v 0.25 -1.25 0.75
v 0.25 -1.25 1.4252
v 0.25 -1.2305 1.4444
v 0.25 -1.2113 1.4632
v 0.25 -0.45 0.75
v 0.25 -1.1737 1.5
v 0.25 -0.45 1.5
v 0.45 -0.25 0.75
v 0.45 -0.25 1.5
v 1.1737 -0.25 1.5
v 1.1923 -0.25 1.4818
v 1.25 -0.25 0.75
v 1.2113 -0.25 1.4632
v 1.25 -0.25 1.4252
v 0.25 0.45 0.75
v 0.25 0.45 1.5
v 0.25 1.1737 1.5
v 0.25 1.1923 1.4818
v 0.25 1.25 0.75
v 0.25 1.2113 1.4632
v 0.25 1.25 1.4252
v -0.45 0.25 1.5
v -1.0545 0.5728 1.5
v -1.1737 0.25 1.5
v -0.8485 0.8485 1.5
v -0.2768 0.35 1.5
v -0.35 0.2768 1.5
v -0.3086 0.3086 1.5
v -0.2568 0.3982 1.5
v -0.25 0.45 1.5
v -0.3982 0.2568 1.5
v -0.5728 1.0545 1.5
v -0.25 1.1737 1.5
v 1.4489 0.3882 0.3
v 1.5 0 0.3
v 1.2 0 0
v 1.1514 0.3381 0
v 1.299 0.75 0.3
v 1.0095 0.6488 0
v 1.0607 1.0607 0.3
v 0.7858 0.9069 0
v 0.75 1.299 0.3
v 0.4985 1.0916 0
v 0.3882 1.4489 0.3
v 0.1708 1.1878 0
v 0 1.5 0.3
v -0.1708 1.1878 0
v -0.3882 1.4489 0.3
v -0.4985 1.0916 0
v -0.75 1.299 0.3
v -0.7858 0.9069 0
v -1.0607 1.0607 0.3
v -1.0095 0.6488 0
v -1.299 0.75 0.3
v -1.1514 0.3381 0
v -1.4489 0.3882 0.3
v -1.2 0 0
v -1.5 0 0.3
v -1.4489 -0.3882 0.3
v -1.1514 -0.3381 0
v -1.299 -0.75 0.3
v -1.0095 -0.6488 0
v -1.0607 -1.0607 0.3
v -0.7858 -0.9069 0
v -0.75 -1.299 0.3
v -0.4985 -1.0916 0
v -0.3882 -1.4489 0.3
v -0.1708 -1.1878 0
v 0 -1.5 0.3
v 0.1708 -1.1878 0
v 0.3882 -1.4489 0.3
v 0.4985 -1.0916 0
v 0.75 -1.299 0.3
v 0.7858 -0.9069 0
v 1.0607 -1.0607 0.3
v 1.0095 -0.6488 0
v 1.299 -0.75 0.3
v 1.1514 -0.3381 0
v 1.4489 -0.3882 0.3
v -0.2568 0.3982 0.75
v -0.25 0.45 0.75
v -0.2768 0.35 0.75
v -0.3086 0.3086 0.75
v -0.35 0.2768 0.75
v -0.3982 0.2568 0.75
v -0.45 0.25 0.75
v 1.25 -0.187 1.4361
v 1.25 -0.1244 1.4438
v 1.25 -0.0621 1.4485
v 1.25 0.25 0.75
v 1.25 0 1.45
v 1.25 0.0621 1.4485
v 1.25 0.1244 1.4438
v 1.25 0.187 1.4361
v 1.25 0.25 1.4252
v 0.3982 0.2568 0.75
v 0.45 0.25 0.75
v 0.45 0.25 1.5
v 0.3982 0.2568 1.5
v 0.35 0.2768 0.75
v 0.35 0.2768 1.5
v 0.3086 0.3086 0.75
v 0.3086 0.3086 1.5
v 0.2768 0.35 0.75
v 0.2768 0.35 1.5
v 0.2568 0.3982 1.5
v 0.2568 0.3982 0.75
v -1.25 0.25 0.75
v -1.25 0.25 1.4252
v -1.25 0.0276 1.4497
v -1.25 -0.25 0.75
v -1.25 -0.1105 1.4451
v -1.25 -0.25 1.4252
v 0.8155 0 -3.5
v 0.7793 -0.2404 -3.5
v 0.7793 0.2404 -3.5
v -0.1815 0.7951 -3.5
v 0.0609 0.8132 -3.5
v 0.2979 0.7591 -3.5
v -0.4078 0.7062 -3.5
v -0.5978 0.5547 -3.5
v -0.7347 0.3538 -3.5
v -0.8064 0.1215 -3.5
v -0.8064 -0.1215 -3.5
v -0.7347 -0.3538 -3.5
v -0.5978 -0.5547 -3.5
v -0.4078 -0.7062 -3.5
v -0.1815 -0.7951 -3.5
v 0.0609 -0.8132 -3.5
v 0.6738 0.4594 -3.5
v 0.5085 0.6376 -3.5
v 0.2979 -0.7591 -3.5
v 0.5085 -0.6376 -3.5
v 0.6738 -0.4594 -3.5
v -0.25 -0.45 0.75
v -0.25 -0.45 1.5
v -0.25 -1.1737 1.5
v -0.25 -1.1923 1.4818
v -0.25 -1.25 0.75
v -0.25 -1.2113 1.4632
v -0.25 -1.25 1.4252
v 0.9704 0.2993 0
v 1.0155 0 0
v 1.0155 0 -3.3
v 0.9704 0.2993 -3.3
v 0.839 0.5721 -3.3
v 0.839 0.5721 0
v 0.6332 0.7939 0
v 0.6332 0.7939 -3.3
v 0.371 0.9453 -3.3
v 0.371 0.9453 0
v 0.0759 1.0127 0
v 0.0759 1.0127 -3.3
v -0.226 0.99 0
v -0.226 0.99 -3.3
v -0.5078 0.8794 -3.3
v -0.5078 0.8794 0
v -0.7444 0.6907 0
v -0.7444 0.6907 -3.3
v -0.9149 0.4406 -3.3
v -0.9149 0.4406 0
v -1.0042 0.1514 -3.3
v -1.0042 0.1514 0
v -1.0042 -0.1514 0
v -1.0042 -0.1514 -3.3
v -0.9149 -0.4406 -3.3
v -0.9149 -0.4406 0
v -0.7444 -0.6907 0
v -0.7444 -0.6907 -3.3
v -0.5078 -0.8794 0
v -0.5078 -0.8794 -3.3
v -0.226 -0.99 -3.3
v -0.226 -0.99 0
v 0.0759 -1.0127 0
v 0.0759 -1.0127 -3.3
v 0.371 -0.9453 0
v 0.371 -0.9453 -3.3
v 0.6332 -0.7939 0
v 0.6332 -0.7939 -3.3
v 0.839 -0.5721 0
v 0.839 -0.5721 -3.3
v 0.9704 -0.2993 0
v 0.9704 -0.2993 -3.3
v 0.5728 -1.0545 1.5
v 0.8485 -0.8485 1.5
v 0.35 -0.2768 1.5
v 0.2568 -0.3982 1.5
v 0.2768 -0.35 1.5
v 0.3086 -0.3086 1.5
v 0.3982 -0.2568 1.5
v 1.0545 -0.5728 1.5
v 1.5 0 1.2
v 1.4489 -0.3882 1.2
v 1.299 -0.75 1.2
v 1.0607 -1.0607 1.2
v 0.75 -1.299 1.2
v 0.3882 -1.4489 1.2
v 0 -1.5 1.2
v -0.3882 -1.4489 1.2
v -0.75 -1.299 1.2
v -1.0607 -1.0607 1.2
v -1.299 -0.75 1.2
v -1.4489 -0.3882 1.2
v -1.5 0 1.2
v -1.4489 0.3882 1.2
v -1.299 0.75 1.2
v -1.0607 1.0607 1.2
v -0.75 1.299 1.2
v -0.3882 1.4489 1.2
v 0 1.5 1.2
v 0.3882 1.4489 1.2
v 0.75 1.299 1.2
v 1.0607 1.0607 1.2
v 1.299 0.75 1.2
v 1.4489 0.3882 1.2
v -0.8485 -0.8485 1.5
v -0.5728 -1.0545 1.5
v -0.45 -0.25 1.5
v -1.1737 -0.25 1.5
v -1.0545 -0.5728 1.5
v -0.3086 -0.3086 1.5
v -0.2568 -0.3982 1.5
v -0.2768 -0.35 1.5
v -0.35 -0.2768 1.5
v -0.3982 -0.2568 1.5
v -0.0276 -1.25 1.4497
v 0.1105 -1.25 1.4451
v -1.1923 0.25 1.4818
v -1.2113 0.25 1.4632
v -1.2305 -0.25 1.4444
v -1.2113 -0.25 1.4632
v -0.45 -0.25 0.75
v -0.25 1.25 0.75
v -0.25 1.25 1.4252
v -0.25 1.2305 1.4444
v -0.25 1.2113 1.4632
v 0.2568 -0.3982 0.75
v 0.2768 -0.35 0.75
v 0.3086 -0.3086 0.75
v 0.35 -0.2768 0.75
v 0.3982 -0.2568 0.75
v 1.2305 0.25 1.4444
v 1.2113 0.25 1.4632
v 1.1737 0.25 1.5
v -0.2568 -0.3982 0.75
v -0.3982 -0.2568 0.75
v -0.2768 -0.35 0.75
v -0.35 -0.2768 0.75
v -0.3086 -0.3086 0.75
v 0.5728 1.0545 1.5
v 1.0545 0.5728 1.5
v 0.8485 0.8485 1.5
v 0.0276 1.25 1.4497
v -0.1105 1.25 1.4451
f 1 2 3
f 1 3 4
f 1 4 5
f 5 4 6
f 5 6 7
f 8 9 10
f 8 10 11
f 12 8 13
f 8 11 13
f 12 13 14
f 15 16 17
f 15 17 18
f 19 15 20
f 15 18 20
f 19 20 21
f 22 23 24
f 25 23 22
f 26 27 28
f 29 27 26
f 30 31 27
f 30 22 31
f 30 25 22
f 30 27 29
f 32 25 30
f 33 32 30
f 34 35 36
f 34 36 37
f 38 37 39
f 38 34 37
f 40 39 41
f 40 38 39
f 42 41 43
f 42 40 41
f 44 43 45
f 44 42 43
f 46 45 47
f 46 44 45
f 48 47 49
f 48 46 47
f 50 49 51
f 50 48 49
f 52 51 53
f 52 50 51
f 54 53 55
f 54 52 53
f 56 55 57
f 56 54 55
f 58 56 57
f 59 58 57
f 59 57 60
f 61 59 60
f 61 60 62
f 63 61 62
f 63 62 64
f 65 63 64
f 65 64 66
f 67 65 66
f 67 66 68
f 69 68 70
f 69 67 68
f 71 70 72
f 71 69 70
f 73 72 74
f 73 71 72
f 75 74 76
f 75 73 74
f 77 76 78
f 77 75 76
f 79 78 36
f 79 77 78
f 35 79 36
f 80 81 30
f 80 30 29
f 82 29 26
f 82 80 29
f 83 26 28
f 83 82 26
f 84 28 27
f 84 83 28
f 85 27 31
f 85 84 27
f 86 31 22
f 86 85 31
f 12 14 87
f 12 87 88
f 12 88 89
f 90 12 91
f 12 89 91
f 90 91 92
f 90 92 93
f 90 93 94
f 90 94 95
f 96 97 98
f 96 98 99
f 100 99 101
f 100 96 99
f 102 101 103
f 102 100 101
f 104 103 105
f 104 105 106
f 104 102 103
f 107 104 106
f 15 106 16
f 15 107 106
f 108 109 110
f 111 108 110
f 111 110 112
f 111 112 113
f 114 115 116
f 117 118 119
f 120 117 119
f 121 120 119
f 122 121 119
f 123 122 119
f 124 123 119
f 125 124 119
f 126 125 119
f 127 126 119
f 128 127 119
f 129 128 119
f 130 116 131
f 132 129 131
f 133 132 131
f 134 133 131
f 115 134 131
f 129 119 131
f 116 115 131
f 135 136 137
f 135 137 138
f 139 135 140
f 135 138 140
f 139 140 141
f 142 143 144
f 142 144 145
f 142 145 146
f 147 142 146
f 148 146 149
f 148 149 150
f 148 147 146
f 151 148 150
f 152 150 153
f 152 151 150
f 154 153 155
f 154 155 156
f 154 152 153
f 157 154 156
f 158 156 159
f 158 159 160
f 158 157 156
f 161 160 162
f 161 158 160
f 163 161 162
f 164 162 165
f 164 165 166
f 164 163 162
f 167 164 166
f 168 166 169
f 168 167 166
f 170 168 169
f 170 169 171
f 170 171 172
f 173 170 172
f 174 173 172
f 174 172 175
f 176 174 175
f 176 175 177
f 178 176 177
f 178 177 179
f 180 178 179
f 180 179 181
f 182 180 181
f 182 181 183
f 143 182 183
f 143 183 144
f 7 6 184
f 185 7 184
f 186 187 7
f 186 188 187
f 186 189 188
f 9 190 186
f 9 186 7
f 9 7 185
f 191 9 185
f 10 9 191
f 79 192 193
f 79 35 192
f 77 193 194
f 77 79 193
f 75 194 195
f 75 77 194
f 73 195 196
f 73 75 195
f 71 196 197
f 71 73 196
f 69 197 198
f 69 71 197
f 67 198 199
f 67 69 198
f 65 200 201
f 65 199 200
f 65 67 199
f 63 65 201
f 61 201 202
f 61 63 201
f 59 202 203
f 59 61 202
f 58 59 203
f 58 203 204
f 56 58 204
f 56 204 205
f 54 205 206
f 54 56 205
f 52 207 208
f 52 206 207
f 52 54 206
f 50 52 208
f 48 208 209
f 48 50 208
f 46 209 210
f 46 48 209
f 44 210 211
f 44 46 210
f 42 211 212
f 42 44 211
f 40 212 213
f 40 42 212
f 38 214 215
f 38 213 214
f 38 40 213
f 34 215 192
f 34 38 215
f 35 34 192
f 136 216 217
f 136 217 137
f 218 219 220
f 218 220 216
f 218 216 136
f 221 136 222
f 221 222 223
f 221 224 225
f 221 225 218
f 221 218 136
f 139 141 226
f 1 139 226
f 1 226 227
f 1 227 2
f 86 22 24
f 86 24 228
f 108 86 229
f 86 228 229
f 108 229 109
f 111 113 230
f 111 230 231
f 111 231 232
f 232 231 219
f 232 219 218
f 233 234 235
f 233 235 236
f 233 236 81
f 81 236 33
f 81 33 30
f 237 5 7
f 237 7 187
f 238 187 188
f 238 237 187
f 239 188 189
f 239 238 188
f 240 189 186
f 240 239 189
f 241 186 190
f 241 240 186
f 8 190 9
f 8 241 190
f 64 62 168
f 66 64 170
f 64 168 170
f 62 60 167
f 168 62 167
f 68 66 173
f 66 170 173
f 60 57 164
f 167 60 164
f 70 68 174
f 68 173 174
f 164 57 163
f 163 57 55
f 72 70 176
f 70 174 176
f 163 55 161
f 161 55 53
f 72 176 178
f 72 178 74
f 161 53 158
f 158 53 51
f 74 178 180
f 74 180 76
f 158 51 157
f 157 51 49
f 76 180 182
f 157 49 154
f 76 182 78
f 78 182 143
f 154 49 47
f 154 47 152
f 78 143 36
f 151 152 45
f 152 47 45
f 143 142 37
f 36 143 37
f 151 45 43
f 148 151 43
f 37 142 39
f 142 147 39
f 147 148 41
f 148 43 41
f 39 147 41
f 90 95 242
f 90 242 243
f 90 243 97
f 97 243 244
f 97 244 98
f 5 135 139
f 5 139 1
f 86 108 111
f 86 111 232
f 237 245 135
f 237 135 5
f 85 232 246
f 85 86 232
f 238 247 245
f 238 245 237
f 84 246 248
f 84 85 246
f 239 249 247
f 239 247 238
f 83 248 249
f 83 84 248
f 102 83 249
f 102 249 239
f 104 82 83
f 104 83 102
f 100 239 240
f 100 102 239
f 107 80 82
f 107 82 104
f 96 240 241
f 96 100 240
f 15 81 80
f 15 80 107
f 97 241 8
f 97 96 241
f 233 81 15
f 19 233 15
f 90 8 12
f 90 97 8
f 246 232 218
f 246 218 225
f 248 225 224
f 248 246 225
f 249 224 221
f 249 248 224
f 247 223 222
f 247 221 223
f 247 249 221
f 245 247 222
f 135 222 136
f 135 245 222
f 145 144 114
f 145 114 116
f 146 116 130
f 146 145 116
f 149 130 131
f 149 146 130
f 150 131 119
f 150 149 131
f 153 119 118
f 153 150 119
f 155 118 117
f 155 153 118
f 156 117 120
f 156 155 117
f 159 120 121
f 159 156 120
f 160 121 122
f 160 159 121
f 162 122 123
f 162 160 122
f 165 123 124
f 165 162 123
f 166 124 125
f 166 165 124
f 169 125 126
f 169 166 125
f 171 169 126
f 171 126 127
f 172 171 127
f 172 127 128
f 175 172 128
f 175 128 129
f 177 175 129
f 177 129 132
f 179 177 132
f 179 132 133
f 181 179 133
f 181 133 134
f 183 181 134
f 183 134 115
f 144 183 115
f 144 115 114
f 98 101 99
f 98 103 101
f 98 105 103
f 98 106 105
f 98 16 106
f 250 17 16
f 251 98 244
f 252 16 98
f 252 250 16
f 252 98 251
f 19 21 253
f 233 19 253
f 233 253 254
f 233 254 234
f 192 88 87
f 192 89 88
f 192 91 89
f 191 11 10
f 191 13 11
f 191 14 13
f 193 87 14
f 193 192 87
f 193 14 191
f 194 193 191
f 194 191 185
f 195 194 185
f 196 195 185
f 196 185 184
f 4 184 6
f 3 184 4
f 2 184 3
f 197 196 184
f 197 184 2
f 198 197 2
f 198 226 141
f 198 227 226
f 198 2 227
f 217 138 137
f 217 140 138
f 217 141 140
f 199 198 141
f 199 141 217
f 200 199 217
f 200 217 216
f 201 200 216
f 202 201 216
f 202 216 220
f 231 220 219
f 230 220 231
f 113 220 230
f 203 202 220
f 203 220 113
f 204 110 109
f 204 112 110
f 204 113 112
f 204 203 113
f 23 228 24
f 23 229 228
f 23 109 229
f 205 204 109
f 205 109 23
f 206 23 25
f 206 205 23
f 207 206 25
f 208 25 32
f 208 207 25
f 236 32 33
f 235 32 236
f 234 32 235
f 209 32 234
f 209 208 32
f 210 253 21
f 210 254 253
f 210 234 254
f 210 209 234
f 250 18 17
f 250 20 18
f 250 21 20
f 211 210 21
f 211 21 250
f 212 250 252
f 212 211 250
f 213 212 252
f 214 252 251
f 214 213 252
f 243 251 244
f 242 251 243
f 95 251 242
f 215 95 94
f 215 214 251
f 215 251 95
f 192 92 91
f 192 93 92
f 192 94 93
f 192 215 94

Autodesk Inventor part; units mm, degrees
ref_plane "YZ Plane" through (0, 0, 0) normal (1, 0, 0) x (0, 1, 0)
ref_plane "XZ Plane" through (0, 0, 0) normal (0, 1, 0) x (-1, 0, 0)
ref_plane "XY Plane" through (0, 0, 0) normal (0, 0, 1) x (1, 0, 0)
sketch "Esboço1" plane through (0, 0, 0) normal (0, 0, 1) x (1, 0, 0)
  circle A0 centre (0, 0) radius 1.0155
  dimension "d0" = 2.031
extrude "Extrusão1" add sketch "Esboço1" against normal blind 3.5
sketch "Esboço2" plane through (0, 0, 0) normal (0, 0, 1) x (1, 0, 0)
  circle A0 centre (0, 0) radius 1.5
  dimension "d3" = 3
extrude "Extrusão2" add sketch "Esboço2" along normal blind 1.5
sketch "Esboço3" plane through (0, 0, 1.5) normal (0, 0, 1) x (1, 0, 0)
  line L0 (-0.25, -1.25) -> (0.25, -1.25)
  line L1 (0.25, -1.25) -> (0.25, 1.25)
  line L2 (0.25, 1.25) -> (-0.25, 1.25)
  line L3 (-0.25, 1.25) -> (-0.25, -1.25)
  line L4 (-0.25, -1.25) -> (0.25, 1.25) construction
  line L5 (0.25, -1.25) -> (-0.25, 1.25) construction
  line L6 (-1.25, -0.25) -> (1.25, -0.25)
  line L7 (1.25, -0.25) -> (1.25, 0.25)
  line L8 (1.25, 0.25) -> (-1.25, 0.25)
  line L9 (-1.25, 0.25) -> (-1.25, -0.25)
  line L10 (-1.25, -0.25) -> (1.25, 0.25) construction
  line L11 (1.25, -0.25) -> (-1.25, 0.25) construction
  point P0 (0, 0)
  point P1 (-0.25, 0.25)
  point P2 (-0.25, -0.25)
  point P3 (0.25, -0.25)
  point P4 (0.25, 0.25)
  dimension "d6" = 0.5
  dimension "d7" = 2.5
  dimension "d8" = 2.5
  dimension "d9" = 0.5
extrude "Extrusão3" cut sketch "Esboço3" against normal blind 0.75
thread "Rosca1" size "M2.2x0.45" class "6g" standard "ANSI Metric M Profile" full length
fillet "Arredondamento3" radius 0.2 4 edges at (-0.25, 0.25, 1.125) (0.25, 0.25, 1.125) (-0.25, -0.25, 1.125) (0.25, -0.25, 1.125)
chamfer "Chanfro1" distance 0.3 angle 45 2 edges at (-1.5, 0, 1.5) (-1.5, 0, 0)
chamfer "Chanfro2" distance 0.2 angle 45 1 edges at (-1.0155, 0, -3.5)
properties part number "Parafuso 2,031" material "Liga de Nickel-Copper 400"
